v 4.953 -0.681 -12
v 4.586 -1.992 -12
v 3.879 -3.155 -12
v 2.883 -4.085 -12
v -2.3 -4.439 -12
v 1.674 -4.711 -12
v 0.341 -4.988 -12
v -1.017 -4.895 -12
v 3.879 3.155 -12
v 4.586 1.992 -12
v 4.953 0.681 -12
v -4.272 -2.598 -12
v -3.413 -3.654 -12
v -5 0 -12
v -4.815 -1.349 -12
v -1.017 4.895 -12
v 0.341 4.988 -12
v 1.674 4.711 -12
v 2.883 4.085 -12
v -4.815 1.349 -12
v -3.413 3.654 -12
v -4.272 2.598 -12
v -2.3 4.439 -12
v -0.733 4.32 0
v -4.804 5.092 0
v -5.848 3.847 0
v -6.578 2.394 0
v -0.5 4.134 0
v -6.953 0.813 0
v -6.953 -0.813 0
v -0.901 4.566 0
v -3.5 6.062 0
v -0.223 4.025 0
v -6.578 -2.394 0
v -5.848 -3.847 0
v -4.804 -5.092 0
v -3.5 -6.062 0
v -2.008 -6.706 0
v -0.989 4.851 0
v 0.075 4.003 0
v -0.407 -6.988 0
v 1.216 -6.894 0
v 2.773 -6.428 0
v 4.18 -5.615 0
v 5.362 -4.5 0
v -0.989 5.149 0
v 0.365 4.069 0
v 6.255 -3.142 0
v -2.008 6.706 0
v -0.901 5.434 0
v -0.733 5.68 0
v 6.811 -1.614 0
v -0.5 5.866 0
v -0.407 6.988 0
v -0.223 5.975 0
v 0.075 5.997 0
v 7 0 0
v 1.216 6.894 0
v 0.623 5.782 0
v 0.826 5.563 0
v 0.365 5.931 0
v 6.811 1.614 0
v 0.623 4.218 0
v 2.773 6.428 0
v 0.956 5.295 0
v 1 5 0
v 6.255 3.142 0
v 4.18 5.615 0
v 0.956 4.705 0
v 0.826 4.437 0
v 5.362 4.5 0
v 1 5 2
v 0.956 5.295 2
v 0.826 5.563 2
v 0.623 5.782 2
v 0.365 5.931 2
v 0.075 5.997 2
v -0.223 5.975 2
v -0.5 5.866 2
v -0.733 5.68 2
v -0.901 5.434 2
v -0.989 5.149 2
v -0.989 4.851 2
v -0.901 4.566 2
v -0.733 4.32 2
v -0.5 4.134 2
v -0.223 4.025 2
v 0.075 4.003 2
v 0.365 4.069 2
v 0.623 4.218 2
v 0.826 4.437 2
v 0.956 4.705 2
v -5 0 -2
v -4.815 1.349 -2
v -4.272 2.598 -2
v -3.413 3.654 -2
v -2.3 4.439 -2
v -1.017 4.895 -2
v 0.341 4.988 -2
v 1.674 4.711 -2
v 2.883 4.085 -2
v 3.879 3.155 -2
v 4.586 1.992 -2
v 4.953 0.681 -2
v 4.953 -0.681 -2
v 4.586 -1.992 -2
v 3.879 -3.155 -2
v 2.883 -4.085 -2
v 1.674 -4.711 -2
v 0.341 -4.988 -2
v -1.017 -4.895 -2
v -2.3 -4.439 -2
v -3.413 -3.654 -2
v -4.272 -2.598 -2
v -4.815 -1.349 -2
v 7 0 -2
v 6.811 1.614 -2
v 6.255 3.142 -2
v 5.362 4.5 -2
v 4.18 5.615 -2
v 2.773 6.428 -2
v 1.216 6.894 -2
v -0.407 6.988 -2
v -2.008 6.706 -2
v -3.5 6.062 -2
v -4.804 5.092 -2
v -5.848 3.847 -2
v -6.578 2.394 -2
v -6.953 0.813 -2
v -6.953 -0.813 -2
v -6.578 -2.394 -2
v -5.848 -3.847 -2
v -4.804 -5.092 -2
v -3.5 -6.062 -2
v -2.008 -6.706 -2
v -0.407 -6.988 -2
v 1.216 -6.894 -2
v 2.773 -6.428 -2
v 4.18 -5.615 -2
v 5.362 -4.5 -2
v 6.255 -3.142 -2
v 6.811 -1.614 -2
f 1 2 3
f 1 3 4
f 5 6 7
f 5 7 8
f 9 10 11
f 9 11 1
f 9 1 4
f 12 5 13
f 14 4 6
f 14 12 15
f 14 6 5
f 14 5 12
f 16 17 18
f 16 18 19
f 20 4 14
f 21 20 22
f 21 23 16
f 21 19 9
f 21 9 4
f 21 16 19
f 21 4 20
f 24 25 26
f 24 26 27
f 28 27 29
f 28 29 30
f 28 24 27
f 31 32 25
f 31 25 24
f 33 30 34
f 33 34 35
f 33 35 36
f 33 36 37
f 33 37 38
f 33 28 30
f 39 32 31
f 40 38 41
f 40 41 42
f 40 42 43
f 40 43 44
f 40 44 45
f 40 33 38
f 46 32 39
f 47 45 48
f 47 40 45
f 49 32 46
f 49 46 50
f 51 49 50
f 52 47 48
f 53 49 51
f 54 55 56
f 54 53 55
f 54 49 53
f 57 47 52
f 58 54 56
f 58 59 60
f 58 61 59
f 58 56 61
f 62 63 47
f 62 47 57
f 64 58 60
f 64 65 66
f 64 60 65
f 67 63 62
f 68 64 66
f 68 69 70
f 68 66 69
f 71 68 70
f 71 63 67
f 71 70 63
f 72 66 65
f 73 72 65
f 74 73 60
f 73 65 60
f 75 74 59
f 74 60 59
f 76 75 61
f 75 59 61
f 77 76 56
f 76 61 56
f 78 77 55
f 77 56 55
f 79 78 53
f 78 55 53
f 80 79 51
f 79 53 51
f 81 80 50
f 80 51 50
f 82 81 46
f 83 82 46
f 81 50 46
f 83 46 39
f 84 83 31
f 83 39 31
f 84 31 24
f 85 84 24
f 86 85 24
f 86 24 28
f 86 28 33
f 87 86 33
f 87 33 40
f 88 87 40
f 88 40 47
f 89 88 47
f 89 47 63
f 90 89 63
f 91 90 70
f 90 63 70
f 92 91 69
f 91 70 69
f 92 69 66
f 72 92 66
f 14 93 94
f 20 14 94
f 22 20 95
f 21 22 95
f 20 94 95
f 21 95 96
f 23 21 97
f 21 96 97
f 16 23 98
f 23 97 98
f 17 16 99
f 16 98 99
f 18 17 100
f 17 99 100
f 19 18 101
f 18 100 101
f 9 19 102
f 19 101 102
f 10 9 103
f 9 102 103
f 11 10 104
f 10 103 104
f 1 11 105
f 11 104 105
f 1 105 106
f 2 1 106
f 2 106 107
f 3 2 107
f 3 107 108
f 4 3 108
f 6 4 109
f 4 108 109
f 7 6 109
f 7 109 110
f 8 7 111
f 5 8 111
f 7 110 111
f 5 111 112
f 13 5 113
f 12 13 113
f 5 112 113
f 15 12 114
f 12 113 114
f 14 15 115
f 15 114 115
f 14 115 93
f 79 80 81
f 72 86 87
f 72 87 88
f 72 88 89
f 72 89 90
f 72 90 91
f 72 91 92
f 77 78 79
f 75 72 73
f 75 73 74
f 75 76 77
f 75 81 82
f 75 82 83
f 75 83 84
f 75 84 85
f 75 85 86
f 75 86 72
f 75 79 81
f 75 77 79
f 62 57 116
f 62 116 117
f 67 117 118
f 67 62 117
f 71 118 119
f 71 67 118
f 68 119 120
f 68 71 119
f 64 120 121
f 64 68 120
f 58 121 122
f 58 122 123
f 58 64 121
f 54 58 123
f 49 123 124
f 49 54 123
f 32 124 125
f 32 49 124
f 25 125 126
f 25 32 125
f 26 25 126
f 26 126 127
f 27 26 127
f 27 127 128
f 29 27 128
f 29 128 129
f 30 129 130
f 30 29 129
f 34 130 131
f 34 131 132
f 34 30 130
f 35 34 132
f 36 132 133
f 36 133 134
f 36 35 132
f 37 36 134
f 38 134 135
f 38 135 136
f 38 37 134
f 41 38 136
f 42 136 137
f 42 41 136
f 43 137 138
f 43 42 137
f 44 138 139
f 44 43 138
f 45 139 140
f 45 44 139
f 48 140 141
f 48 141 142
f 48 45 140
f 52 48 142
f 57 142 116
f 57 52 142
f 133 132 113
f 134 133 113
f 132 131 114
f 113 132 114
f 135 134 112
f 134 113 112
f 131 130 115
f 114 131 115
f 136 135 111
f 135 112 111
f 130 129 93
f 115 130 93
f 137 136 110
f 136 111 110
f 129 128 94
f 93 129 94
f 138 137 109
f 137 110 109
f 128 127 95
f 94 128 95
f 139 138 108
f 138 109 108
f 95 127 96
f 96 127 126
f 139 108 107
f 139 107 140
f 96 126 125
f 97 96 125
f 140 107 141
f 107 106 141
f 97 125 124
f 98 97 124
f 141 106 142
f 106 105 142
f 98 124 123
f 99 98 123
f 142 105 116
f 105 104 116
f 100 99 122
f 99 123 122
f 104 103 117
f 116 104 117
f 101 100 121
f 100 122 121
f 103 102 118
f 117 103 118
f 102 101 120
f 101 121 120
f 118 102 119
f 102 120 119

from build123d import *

# Parameters (mm, degrees)
SKETCH1_R           = 7
BOSS_EXTRUDE1_DEPTH = 2
SKETCH2_R           = 1
BOSS_EXTRUDE2_DEPTH = 2
SKETCH3_R           = 5
BOSS_EXTRUDE3_DEPTH = 10


with BuildPart() as part:
    # Sketch1 → Boss-Extrude1 (new body)
    with BuildSketch(Plane.XY):
        Circle(SKETCH1_R)
    extrude(amount=-BOSS_EXTRUDE1_DEPTH)

    # Sketch2 → Boss-Extrude2 (add)
    with BuildSketch(Plane.XY):
        with Locations((0, 5)):
            Circle(SKETCH2_R)
    extrude(amount=BOSS_EXTRUDE2_DEPTH)

    # Sketch3 → Boss-Extrude3 (add)
    with BuildSketch(Plane(origin=(0, 0, -2), x_dir=(-1, 0, 0), z_dir=(0, 0, -1))):
        Circle(SKETCH3_R)
    extrude(amount=BOSS_EXTRUDE3_DEPTH)


solid = part.part
